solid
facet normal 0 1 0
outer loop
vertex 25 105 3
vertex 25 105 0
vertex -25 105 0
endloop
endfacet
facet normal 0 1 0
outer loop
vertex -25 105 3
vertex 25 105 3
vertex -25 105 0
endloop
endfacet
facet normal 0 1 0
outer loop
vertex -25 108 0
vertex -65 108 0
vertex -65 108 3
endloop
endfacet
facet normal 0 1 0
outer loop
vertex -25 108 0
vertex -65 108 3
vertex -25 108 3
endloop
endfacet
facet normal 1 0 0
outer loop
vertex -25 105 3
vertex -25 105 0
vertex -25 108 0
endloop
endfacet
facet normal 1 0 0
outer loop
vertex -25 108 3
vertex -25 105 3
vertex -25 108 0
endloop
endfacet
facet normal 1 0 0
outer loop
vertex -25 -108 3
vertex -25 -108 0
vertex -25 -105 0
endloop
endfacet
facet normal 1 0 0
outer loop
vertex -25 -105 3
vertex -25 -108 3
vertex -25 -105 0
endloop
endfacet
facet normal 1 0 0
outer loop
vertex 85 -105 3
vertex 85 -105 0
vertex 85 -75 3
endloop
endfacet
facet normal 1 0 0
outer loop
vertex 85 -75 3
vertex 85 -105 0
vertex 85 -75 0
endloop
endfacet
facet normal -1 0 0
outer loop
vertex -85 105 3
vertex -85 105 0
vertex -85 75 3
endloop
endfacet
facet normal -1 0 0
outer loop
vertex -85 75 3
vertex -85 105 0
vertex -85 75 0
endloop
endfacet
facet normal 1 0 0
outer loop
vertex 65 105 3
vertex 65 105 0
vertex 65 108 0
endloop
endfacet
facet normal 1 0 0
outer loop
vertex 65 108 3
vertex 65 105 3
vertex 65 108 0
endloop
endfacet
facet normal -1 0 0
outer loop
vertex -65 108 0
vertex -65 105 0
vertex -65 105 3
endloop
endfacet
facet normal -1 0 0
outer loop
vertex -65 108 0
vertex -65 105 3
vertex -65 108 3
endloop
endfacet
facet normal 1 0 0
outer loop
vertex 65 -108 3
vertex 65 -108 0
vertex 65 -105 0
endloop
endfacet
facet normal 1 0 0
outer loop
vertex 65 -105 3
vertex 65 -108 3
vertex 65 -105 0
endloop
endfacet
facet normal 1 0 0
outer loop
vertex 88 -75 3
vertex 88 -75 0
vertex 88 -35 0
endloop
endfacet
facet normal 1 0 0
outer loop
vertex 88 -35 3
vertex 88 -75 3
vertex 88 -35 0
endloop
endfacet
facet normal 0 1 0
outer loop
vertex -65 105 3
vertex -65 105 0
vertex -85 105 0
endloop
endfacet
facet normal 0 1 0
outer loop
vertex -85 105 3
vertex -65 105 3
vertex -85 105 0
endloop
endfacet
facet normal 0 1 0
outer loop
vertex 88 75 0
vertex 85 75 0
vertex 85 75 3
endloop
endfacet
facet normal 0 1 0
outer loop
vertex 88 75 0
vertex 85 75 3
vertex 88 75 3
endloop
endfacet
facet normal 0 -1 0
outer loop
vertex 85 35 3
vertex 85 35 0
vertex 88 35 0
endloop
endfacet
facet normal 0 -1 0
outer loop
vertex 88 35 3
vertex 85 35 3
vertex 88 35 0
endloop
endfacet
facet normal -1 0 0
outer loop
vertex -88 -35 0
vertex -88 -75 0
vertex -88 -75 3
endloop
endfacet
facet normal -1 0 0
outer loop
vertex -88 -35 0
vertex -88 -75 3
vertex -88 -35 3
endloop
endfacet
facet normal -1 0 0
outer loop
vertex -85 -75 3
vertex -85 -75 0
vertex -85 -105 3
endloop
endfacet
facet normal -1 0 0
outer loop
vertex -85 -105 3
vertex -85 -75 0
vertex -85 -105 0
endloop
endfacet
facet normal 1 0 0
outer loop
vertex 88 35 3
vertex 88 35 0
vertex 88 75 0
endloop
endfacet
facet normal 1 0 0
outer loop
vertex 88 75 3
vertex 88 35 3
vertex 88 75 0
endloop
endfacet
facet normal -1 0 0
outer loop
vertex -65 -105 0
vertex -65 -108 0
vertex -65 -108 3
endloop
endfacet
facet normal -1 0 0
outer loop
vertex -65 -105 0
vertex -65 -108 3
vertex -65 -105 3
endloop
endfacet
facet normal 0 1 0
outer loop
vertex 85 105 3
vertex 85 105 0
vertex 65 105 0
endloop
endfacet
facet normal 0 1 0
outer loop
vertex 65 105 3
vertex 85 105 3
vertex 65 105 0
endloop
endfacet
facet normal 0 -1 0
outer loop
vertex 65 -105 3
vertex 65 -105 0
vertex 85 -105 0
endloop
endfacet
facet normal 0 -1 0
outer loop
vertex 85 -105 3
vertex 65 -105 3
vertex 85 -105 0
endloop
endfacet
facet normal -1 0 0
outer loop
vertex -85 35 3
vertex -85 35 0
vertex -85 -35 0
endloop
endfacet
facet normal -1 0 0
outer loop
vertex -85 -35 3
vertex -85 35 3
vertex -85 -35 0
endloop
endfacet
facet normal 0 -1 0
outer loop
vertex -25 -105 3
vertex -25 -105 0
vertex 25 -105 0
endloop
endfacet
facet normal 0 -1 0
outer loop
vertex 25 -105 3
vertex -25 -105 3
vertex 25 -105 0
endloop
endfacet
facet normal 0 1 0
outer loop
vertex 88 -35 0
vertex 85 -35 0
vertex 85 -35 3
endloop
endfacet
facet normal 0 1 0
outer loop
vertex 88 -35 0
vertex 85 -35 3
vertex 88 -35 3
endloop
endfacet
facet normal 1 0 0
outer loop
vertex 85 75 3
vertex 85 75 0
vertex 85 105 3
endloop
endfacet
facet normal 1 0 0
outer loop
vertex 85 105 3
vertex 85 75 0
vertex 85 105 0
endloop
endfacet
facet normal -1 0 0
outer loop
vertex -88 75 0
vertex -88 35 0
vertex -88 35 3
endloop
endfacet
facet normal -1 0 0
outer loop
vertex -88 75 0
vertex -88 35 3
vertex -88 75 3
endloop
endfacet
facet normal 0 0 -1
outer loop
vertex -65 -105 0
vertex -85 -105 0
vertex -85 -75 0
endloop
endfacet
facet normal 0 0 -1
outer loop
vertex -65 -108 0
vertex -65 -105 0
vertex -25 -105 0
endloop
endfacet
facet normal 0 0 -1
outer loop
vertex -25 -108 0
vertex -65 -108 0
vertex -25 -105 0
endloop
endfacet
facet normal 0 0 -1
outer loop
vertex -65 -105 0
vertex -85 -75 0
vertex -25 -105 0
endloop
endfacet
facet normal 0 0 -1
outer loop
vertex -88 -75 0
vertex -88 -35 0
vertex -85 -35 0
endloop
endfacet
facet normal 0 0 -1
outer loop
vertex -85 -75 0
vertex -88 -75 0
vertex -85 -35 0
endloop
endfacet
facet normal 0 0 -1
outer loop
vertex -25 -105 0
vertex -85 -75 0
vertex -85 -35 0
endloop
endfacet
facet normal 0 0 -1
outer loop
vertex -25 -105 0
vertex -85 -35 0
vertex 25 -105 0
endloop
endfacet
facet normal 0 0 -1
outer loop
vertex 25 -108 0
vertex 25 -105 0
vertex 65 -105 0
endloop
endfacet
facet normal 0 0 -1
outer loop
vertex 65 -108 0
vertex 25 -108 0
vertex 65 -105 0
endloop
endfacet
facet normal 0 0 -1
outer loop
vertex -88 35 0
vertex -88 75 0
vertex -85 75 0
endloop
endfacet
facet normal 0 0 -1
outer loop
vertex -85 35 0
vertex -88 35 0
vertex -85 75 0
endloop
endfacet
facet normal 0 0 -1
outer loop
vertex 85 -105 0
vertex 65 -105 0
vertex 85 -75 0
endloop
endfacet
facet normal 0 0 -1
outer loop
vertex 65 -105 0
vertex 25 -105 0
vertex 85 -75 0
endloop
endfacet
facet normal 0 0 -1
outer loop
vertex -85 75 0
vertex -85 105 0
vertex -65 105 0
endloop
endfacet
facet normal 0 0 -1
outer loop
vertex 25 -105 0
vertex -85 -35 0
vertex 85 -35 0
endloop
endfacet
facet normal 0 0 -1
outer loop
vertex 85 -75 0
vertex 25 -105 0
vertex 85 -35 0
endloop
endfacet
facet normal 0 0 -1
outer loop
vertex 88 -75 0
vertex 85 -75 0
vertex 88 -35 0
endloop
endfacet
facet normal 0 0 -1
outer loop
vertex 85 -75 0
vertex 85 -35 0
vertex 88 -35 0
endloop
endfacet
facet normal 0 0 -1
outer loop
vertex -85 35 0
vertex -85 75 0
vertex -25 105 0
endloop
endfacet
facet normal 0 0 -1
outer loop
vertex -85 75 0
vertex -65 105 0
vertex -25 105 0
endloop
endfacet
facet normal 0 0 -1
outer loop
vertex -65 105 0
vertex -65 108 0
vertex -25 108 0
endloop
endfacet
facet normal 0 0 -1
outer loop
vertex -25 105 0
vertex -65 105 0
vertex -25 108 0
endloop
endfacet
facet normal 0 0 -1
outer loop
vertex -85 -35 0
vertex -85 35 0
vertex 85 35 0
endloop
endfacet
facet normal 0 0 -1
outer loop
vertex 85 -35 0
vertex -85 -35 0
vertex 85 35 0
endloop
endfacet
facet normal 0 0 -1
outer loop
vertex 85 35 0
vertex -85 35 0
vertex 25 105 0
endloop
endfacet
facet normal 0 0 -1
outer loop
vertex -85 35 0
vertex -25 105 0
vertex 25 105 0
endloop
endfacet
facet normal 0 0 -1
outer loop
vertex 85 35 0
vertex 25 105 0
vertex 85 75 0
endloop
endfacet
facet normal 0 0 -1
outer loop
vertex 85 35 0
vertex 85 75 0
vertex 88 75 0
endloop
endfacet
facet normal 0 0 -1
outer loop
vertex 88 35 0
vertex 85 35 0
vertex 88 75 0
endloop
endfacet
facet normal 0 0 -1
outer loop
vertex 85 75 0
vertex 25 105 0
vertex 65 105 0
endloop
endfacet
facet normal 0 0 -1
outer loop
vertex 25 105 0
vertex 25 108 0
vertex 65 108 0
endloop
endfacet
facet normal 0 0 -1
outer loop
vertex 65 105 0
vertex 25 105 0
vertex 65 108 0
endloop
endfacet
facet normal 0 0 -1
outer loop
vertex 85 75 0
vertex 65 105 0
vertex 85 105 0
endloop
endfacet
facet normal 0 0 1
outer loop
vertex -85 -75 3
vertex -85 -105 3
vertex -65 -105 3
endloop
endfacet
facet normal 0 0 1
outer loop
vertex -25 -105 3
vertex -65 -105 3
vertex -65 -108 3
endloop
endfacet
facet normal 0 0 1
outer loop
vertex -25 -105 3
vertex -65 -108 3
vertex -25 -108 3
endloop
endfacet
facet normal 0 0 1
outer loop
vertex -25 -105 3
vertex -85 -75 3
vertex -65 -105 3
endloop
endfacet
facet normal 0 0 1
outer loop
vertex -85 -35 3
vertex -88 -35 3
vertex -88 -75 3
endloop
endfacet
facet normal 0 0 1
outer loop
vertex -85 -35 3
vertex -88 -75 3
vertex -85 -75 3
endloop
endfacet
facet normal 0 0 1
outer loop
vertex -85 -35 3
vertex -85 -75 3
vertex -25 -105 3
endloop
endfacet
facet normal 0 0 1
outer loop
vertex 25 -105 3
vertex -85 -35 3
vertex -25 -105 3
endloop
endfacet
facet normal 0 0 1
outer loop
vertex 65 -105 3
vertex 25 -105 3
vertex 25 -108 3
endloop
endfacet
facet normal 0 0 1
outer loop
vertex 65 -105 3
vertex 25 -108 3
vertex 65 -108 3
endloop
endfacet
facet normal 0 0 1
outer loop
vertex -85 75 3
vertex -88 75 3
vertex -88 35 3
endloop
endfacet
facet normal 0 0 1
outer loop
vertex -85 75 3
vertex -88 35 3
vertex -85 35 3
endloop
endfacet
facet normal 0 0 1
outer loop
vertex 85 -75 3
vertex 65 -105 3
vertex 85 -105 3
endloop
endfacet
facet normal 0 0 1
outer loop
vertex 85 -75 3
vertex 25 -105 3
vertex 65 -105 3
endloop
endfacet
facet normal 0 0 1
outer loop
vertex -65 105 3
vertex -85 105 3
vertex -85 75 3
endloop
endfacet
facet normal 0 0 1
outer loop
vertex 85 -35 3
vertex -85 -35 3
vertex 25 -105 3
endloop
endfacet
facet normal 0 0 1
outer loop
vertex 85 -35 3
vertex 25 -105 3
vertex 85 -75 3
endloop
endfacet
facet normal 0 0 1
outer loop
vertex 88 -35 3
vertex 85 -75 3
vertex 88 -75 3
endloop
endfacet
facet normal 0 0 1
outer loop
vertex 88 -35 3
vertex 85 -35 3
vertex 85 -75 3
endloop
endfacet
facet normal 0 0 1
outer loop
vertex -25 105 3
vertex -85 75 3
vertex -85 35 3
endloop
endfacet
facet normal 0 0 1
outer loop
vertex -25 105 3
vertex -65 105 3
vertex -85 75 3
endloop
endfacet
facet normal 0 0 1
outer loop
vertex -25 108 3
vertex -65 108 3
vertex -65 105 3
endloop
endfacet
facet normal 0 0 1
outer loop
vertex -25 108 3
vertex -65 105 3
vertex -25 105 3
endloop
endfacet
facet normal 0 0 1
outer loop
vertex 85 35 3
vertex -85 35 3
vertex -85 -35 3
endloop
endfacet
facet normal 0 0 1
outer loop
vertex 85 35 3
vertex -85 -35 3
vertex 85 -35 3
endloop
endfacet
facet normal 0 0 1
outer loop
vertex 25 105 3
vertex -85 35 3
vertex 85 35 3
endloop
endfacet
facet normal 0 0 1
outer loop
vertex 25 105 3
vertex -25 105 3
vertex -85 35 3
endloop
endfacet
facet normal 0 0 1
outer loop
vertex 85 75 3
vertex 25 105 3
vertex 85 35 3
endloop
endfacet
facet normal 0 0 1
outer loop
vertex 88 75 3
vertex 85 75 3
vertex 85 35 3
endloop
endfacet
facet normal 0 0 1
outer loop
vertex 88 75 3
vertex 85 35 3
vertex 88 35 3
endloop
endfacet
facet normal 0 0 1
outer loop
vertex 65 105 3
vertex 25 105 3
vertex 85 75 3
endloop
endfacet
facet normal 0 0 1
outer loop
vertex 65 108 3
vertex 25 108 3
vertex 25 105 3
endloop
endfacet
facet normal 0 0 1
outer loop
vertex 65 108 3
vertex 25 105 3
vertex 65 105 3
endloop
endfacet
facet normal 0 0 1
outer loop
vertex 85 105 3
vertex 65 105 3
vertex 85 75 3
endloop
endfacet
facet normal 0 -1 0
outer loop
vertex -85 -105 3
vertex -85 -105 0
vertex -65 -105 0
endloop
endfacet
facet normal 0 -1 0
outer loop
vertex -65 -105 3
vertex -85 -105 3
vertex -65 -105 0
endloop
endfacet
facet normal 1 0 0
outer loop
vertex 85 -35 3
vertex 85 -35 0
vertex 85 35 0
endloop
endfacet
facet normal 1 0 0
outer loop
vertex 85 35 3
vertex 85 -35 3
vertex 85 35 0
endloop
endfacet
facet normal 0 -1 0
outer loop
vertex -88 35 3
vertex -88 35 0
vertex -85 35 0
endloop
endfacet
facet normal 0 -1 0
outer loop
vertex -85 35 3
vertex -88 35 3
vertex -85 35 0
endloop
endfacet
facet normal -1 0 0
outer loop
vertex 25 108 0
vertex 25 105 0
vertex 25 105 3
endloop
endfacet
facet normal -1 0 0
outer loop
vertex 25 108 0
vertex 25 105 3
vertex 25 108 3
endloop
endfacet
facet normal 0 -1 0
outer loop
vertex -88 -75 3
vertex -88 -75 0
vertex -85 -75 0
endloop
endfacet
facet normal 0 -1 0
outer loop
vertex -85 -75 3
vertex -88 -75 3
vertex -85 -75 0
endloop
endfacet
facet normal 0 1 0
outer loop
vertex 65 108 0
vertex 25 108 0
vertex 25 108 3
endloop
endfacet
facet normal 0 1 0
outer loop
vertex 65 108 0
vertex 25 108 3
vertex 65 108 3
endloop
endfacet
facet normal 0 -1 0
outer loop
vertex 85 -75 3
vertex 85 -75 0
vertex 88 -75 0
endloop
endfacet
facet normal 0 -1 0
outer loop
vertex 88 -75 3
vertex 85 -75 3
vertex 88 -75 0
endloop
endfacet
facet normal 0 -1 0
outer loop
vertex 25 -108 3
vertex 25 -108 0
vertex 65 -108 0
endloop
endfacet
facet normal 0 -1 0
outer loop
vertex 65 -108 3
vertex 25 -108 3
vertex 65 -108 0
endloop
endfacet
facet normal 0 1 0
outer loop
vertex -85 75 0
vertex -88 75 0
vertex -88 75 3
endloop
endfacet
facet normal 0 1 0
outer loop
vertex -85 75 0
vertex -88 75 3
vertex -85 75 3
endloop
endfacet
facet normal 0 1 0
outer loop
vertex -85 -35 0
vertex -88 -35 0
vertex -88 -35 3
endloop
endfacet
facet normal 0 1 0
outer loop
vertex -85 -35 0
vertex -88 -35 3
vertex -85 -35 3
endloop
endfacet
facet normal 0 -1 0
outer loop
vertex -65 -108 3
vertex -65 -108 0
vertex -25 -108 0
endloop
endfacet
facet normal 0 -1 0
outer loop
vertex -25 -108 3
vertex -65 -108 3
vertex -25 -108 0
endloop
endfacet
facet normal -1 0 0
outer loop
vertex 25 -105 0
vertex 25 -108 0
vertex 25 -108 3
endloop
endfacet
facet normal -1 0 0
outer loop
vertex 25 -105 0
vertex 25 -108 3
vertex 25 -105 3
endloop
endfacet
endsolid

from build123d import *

# Parameters (mm, degrees)
F0_W     = 40
F0_H     = 3
F0_W_2   = 3
F0_H_2   = 40
F1_DEPTH = 3


with BuildPart() as f1:
    # F0 (on Top) → F1 (new body)
    with BuildSketch(Plane.XY):
        Polygon((85, 75), (85, 105), (65, 105), (25, 105), (-25, 105), (-65, 105), (-85, 105), (-85, 75), (-85, 35), (-85, -35), (-85, -75), (-85, -105), (-65, -105), (-25, -105), (25, -105), (65, -105), (85, -105), (85, -75), (85, -35), (85, 35), align=None)
        with Locations((45, 106.5)):
            Rectangle(F0_W, F0_H)
        with Locations((86.5, 55)):
            Rectangle(F0_W_2, F0_H_2)
        with Locations((-45, 106.5)):
            Rectangle(F0_W, F0_H)
        with Locations((86.5, -55)):
            Rectangle(F0_W_2, F0_H_2)
        with Locations((-86.5, 55)):
            Rectangle(F0_W_2, F0_H_2)
        with Locations((45, -106.5)):
            Rectangle(F0_W, F0_H)
        with Locations((-86.5, -55)):
            Rectangle(F0_W_2, F0_H_2)
        with Locations((-45, -106.5)):
            Rectangle(F0_W, F0_H)
    extrude(amount=F1_DEPTH)


solid = f1.part
